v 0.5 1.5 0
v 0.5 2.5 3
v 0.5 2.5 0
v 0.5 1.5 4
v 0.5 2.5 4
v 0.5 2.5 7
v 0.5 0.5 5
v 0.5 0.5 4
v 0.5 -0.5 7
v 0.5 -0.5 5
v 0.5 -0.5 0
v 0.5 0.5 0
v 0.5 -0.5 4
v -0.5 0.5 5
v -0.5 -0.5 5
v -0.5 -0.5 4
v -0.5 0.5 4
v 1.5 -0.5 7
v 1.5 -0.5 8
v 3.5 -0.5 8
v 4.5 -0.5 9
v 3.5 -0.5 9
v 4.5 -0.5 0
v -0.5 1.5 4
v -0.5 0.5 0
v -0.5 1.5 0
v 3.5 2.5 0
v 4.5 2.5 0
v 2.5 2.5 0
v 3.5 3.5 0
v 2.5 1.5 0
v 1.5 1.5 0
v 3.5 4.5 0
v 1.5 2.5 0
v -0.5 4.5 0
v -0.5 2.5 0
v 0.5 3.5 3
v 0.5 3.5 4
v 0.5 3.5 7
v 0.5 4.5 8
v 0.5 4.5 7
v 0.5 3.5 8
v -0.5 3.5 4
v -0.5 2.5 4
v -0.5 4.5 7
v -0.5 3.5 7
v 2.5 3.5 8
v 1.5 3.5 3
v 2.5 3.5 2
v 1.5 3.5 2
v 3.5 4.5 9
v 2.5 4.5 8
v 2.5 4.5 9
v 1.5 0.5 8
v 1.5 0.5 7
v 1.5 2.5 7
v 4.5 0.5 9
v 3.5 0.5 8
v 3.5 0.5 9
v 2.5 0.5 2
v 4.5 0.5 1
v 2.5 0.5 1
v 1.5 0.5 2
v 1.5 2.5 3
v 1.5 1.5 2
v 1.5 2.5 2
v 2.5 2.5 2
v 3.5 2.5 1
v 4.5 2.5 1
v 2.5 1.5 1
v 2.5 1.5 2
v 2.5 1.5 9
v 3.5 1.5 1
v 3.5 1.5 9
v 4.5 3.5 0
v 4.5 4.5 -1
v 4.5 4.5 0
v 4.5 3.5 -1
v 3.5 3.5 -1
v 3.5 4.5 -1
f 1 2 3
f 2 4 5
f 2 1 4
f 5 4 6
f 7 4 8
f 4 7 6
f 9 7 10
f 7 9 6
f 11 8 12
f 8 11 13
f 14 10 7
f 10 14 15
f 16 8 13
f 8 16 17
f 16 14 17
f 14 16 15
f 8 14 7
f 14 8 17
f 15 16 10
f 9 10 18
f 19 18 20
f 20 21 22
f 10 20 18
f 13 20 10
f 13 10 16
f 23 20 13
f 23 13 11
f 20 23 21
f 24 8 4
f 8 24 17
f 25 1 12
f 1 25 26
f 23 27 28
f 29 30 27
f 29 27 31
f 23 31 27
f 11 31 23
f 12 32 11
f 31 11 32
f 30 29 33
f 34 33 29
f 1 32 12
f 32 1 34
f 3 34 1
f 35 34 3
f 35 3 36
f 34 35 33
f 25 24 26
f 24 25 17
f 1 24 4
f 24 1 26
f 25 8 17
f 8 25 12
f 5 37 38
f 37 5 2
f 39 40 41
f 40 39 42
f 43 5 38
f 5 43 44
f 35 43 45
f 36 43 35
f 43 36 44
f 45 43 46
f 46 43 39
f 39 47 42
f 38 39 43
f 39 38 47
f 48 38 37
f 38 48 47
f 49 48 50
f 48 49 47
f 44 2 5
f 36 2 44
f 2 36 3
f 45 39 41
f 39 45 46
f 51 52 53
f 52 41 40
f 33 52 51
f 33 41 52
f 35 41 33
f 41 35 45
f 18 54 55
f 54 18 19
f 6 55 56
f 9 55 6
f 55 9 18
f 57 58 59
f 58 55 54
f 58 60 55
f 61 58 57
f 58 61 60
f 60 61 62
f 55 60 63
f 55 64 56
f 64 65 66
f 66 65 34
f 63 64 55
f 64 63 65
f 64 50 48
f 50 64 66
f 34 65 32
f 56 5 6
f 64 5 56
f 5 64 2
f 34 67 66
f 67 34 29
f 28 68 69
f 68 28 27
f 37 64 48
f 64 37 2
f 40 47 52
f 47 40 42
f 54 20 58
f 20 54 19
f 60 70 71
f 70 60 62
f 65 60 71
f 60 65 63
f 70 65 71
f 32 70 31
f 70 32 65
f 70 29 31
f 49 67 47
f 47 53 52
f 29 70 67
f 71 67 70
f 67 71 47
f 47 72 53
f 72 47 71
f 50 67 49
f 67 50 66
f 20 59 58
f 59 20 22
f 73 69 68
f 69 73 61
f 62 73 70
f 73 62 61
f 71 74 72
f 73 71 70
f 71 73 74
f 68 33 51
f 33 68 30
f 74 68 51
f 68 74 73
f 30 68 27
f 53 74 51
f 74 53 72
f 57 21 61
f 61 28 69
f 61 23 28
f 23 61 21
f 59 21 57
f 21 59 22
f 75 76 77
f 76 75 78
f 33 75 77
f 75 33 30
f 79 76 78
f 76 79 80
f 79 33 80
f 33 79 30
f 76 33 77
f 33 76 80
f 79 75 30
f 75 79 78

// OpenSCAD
union() {
    translate([0, 0, 4.5]) color([1, 0, 0]) cube([1, 1, 1], center=true);
    translate([0, 1, 2.0]) cube([1, 1, 4], center=true);
    translate([0, 3, 2.0]) cube([1, 1, 4], center=true);
    translate([0, 4, 3.5]) cube([1, 1, 7], center=true);
    translate([1, 0, 3.5]) cube([1, 1, 7], center=true);
    translate([1, 1, 3.5]) cube([1, 1, 7], center=true);
    translate([1, 2, 3.5]) cube([1, 1, 7], center=true);
    translate([1, 3, 1.5]) cube([1, 1, 3], center=true);
    translate([1, 4, 4.0]) cube([1, 1, 8], center=true);
    translate([2, 0, 4.0]) cube([1, 1, 8], center=true);
    translate([2, 1, 1.0]) cube([1, 1, 2], center=true);
    translate([2, 3, 1.0]) cube([1, 1, 2], center=true);
    translate([2, 4, 4.0]) cube([1, 1, 8], center=true);
    translate([3, 0, 4.0]) cube([1, 1, 8], center=true);
    translate([3, 1, 0.5]) cube([1, 1, 1], center=true);
    translate([3, 2, 4.5]) cube([1, 1, 9], center=true);
    translate([3, 3, 4.5]) cube([1, 1, 9], center=true);
    translate([3, 4, 4.5]) cube([1, 1, 9], center=true);
    translate([4, 0, 4.5]) cube([1, 1, 9], center=true);
    translate([4, 1, 0.5]) cube([1, 1, 1], center=true);
    translate([4, 2, 0.5]) cube([1, 1, 1], center=true);
    translate([4, 4, -0.5]) color([0, 0, 1]) cube([1, 1, 1], center=true);
}
